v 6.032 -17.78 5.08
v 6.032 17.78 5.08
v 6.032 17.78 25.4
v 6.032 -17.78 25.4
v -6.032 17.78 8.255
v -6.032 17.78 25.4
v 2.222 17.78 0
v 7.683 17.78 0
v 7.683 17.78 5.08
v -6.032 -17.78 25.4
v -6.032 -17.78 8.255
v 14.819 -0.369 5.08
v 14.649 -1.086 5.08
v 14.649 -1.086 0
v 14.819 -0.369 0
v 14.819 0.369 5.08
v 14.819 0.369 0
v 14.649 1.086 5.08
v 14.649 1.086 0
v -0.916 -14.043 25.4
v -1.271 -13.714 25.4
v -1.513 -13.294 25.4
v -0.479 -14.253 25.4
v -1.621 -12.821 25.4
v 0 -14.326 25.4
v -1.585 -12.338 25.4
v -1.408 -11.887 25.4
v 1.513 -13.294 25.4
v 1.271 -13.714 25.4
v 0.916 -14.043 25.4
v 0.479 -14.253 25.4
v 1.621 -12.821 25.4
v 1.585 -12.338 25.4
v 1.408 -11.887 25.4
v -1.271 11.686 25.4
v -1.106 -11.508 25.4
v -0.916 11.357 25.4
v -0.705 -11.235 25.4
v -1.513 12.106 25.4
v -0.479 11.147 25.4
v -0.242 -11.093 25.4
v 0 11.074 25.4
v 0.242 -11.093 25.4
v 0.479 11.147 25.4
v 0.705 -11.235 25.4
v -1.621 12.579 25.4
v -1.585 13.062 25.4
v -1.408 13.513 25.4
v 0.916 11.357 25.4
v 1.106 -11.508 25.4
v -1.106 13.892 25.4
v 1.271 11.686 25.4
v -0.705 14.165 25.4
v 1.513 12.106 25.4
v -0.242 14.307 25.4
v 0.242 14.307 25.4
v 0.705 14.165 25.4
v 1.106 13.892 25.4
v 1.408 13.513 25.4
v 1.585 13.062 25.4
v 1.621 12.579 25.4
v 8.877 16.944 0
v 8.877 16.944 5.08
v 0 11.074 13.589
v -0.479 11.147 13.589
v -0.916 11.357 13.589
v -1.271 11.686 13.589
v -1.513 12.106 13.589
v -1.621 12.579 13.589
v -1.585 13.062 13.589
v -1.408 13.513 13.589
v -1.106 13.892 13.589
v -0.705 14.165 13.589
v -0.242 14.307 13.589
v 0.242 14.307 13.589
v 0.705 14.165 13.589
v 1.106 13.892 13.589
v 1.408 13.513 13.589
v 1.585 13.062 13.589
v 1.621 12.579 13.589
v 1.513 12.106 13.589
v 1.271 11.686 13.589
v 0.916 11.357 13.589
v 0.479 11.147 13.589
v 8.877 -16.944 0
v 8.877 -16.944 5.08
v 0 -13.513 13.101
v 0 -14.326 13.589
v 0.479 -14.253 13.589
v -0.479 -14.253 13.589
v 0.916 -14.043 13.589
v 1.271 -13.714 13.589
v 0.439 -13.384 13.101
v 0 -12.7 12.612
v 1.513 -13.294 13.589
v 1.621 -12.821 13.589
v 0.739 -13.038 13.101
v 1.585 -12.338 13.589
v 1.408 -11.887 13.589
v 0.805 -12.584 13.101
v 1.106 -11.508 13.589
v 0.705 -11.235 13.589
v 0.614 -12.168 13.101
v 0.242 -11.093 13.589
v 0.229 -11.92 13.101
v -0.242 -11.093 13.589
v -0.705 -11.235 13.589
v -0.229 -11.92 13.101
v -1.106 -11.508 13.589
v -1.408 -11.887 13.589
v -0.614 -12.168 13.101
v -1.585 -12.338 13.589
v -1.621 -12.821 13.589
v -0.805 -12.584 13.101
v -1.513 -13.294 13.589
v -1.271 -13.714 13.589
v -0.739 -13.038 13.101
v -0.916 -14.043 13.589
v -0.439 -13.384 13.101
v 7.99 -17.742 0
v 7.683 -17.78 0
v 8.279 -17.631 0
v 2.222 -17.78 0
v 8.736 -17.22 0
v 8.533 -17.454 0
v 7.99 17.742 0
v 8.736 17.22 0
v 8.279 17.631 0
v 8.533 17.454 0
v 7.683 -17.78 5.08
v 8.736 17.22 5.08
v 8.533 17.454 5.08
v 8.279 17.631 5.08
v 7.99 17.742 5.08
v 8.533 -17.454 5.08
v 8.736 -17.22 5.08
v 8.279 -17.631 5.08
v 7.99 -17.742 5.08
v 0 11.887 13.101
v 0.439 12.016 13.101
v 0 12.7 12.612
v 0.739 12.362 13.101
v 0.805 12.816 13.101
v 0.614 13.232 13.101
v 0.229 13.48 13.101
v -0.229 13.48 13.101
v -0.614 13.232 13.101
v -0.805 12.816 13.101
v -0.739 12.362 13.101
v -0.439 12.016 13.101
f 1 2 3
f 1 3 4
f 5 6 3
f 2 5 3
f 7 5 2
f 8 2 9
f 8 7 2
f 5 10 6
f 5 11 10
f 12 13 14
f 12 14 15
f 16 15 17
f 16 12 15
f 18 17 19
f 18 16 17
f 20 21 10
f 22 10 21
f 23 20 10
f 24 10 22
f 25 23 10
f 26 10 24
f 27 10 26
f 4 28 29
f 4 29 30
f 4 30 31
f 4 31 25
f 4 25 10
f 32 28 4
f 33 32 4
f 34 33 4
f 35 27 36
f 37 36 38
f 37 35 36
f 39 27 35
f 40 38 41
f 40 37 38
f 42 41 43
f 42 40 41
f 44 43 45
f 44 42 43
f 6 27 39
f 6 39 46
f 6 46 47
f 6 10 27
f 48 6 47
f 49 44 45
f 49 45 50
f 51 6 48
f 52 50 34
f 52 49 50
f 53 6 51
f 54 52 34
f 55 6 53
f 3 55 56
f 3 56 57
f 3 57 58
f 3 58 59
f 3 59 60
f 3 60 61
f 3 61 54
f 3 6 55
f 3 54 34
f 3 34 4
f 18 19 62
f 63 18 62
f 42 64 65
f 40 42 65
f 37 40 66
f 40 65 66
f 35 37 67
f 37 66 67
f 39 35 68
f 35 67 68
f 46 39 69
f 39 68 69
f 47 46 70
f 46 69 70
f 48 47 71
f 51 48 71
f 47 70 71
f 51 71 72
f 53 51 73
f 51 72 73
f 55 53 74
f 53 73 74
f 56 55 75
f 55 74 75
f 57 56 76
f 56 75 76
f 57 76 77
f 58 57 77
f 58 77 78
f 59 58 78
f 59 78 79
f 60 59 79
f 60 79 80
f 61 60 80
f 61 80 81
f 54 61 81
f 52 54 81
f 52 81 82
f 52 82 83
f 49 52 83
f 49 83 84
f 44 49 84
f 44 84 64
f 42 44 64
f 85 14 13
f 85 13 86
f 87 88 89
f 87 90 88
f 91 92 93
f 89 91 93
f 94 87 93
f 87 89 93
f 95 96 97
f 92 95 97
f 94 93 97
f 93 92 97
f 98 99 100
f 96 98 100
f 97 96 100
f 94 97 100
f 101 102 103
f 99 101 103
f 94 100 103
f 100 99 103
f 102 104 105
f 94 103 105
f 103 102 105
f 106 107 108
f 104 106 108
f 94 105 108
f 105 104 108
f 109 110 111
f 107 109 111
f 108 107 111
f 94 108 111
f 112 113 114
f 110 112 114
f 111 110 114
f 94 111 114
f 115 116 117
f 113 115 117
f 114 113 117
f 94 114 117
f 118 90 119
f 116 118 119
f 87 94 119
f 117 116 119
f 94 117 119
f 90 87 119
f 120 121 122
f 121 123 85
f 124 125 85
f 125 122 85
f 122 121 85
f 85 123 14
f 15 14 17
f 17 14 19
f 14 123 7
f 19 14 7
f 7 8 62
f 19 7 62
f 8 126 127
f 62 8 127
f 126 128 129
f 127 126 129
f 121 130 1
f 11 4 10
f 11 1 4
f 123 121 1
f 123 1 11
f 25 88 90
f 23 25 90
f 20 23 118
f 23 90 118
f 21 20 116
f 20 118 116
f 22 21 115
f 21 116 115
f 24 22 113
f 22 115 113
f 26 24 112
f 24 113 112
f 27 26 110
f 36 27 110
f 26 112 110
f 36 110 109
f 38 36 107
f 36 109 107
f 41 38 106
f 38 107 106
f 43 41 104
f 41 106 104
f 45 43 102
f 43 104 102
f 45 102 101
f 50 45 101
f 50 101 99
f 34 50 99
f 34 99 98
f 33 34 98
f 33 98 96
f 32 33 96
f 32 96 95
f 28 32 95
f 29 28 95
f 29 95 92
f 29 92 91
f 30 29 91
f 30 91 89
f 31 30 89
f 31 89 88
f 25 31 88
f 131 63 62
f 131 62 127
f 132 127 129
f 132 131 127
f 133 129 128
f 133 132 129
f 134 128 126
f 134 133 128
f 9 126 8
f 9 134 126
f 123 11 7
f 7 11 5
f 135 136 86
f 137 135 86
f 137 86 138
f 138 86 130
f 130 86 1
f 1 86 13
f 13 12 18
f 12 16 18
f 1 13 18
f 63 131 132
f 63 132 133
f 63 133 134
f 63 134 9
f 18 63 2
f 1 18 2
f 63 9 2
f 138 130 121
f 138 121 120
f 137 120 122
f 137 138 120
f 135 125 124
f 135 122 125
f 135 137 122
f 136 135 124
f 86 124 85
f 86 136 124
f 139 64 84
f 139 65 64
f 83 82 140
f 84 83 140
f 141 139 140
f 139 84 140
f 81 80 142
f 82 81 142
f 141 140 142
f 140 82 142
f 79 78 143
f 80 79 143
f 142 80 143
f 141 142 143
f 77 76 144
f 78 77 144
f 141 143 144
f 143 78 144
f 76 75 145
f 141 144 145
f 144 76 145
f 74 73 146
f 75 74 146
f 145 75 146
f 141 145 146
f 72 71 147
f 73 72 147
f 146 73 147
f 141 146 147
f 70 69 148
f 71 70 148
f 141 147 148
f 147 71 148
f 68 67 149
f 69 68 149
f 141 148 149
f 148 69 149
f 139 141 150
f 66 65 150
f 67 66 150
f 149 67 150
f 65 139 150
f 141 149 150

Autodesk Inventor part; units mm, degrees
ref_plane "YZ Plane" through (0, 0, 0) normal (1, 0, 0) x (0, 1, 0)
ref_plane "XZ Plane" through (0, 0, 0) normal (0, 1, 0) x (-1, 0, 0)
ref_plane "XY Plane" through (0, 0, 0) normal (0, 0, 1) x (1, 0, 0)
sketch "Sketch1" plane through (0, 0, 0) normal (0, 0, 1) x (1, 0, 0)
  line L0 (6.0325, -17.78) -> (-6.0325, -17.78)
  line L1 (-6.0325, -17.78) -> (-6.0325, 17.78)
  line L2 (-6.0325, 17.78) -> (6.0325, 17.78)
  line L3 (6.0325, 17.78) -> (6.0325, -17.78)
  line L4 (6.0325, -17.78) -> (-6.0325, 17.78) construction
  line L5 (-6.0325, -17.78) -> (6.0325, 17.78) construction
  point P0 (0, 0)
  dimension "d0" = 12.065
  dimension "d1" = 35.56
extrude "Extrusion1" add sketch "Sketch1" along normal blind 25.4
sketch "Sketch3" plane through (0, 0, 25.4) normal (0, 0, 1) x (1, 0, 0)
  line L0 (6.0325, -17.78) -> (6.0325, 17.78) projected
  line L1 (0, 26.67) -> (0, -26.67) projected
  line L2 (-8.4455, 0) -> (8.4455, 0) projected
  point P0 (0, 12.7)
  point P1 (0, -12.7)
  dimension "d45" = 12.7
  dimension "d46" = 12.7
  dimension "d47" = 0
hole "Hole5" at (0, 12.7, 25.4) at (0, -12.7, 25.4) direction (0, 0, -1) diameter 3.2512 depth 11.811 tip angle 118
sketch "Sketch7" plane through (0, 0, 0) normal (0, 0, -1) x (-1, 0, 0)
  line L0 (-6.0325, -17.78) -> (6.0325, -17.78) projected
  line L1 (6.0325, 17.78) -> (-6.0325, 17.78) projected
  line L2 (-6.0325, 17.78) -> (-6.0325, -17.78) projected
  line L3 (-15.0439, 0) -> (-8.5725, -17.78)
  line L4 (-6.0325, -17.78) -> (-8.5725, -17.78)
  line L5 (-15.0439, 0) -> (-8.5725, 17.78)
  line L6 (-8.5725, 17.78) -> (-6.0325, 17.78)
  line L7 (0, -26.67) -> (0, 26.67) projected
  line L8 (-19.0666, 0) -> (10.2157, 0) projected
  point P0 (0, 0)
  dimension "d70" = 70
  dimension "d71" = 70
  dimension "d72" = 2.54
extrude "Extrusion6" add sketch "Sketch7" against normal blind 5.08 contours L4 L3 L8 L2 | L8 L5 L6 L2
fillet "Fillet1" radius 3.175 1 edges at (15.0439, 0, 2.54)
fillet "Fillet2" radius 1.27 2 edges at (8.5725, -17.78, 2.54) (8.5725, 17.78, 2.54)
chamfer "Chamfer1" distance 8.255 angle 45 1 edges at (-6.0325, 0, 0)
properties part number "J005413" material "ALUMINUM, 6061-T651"
